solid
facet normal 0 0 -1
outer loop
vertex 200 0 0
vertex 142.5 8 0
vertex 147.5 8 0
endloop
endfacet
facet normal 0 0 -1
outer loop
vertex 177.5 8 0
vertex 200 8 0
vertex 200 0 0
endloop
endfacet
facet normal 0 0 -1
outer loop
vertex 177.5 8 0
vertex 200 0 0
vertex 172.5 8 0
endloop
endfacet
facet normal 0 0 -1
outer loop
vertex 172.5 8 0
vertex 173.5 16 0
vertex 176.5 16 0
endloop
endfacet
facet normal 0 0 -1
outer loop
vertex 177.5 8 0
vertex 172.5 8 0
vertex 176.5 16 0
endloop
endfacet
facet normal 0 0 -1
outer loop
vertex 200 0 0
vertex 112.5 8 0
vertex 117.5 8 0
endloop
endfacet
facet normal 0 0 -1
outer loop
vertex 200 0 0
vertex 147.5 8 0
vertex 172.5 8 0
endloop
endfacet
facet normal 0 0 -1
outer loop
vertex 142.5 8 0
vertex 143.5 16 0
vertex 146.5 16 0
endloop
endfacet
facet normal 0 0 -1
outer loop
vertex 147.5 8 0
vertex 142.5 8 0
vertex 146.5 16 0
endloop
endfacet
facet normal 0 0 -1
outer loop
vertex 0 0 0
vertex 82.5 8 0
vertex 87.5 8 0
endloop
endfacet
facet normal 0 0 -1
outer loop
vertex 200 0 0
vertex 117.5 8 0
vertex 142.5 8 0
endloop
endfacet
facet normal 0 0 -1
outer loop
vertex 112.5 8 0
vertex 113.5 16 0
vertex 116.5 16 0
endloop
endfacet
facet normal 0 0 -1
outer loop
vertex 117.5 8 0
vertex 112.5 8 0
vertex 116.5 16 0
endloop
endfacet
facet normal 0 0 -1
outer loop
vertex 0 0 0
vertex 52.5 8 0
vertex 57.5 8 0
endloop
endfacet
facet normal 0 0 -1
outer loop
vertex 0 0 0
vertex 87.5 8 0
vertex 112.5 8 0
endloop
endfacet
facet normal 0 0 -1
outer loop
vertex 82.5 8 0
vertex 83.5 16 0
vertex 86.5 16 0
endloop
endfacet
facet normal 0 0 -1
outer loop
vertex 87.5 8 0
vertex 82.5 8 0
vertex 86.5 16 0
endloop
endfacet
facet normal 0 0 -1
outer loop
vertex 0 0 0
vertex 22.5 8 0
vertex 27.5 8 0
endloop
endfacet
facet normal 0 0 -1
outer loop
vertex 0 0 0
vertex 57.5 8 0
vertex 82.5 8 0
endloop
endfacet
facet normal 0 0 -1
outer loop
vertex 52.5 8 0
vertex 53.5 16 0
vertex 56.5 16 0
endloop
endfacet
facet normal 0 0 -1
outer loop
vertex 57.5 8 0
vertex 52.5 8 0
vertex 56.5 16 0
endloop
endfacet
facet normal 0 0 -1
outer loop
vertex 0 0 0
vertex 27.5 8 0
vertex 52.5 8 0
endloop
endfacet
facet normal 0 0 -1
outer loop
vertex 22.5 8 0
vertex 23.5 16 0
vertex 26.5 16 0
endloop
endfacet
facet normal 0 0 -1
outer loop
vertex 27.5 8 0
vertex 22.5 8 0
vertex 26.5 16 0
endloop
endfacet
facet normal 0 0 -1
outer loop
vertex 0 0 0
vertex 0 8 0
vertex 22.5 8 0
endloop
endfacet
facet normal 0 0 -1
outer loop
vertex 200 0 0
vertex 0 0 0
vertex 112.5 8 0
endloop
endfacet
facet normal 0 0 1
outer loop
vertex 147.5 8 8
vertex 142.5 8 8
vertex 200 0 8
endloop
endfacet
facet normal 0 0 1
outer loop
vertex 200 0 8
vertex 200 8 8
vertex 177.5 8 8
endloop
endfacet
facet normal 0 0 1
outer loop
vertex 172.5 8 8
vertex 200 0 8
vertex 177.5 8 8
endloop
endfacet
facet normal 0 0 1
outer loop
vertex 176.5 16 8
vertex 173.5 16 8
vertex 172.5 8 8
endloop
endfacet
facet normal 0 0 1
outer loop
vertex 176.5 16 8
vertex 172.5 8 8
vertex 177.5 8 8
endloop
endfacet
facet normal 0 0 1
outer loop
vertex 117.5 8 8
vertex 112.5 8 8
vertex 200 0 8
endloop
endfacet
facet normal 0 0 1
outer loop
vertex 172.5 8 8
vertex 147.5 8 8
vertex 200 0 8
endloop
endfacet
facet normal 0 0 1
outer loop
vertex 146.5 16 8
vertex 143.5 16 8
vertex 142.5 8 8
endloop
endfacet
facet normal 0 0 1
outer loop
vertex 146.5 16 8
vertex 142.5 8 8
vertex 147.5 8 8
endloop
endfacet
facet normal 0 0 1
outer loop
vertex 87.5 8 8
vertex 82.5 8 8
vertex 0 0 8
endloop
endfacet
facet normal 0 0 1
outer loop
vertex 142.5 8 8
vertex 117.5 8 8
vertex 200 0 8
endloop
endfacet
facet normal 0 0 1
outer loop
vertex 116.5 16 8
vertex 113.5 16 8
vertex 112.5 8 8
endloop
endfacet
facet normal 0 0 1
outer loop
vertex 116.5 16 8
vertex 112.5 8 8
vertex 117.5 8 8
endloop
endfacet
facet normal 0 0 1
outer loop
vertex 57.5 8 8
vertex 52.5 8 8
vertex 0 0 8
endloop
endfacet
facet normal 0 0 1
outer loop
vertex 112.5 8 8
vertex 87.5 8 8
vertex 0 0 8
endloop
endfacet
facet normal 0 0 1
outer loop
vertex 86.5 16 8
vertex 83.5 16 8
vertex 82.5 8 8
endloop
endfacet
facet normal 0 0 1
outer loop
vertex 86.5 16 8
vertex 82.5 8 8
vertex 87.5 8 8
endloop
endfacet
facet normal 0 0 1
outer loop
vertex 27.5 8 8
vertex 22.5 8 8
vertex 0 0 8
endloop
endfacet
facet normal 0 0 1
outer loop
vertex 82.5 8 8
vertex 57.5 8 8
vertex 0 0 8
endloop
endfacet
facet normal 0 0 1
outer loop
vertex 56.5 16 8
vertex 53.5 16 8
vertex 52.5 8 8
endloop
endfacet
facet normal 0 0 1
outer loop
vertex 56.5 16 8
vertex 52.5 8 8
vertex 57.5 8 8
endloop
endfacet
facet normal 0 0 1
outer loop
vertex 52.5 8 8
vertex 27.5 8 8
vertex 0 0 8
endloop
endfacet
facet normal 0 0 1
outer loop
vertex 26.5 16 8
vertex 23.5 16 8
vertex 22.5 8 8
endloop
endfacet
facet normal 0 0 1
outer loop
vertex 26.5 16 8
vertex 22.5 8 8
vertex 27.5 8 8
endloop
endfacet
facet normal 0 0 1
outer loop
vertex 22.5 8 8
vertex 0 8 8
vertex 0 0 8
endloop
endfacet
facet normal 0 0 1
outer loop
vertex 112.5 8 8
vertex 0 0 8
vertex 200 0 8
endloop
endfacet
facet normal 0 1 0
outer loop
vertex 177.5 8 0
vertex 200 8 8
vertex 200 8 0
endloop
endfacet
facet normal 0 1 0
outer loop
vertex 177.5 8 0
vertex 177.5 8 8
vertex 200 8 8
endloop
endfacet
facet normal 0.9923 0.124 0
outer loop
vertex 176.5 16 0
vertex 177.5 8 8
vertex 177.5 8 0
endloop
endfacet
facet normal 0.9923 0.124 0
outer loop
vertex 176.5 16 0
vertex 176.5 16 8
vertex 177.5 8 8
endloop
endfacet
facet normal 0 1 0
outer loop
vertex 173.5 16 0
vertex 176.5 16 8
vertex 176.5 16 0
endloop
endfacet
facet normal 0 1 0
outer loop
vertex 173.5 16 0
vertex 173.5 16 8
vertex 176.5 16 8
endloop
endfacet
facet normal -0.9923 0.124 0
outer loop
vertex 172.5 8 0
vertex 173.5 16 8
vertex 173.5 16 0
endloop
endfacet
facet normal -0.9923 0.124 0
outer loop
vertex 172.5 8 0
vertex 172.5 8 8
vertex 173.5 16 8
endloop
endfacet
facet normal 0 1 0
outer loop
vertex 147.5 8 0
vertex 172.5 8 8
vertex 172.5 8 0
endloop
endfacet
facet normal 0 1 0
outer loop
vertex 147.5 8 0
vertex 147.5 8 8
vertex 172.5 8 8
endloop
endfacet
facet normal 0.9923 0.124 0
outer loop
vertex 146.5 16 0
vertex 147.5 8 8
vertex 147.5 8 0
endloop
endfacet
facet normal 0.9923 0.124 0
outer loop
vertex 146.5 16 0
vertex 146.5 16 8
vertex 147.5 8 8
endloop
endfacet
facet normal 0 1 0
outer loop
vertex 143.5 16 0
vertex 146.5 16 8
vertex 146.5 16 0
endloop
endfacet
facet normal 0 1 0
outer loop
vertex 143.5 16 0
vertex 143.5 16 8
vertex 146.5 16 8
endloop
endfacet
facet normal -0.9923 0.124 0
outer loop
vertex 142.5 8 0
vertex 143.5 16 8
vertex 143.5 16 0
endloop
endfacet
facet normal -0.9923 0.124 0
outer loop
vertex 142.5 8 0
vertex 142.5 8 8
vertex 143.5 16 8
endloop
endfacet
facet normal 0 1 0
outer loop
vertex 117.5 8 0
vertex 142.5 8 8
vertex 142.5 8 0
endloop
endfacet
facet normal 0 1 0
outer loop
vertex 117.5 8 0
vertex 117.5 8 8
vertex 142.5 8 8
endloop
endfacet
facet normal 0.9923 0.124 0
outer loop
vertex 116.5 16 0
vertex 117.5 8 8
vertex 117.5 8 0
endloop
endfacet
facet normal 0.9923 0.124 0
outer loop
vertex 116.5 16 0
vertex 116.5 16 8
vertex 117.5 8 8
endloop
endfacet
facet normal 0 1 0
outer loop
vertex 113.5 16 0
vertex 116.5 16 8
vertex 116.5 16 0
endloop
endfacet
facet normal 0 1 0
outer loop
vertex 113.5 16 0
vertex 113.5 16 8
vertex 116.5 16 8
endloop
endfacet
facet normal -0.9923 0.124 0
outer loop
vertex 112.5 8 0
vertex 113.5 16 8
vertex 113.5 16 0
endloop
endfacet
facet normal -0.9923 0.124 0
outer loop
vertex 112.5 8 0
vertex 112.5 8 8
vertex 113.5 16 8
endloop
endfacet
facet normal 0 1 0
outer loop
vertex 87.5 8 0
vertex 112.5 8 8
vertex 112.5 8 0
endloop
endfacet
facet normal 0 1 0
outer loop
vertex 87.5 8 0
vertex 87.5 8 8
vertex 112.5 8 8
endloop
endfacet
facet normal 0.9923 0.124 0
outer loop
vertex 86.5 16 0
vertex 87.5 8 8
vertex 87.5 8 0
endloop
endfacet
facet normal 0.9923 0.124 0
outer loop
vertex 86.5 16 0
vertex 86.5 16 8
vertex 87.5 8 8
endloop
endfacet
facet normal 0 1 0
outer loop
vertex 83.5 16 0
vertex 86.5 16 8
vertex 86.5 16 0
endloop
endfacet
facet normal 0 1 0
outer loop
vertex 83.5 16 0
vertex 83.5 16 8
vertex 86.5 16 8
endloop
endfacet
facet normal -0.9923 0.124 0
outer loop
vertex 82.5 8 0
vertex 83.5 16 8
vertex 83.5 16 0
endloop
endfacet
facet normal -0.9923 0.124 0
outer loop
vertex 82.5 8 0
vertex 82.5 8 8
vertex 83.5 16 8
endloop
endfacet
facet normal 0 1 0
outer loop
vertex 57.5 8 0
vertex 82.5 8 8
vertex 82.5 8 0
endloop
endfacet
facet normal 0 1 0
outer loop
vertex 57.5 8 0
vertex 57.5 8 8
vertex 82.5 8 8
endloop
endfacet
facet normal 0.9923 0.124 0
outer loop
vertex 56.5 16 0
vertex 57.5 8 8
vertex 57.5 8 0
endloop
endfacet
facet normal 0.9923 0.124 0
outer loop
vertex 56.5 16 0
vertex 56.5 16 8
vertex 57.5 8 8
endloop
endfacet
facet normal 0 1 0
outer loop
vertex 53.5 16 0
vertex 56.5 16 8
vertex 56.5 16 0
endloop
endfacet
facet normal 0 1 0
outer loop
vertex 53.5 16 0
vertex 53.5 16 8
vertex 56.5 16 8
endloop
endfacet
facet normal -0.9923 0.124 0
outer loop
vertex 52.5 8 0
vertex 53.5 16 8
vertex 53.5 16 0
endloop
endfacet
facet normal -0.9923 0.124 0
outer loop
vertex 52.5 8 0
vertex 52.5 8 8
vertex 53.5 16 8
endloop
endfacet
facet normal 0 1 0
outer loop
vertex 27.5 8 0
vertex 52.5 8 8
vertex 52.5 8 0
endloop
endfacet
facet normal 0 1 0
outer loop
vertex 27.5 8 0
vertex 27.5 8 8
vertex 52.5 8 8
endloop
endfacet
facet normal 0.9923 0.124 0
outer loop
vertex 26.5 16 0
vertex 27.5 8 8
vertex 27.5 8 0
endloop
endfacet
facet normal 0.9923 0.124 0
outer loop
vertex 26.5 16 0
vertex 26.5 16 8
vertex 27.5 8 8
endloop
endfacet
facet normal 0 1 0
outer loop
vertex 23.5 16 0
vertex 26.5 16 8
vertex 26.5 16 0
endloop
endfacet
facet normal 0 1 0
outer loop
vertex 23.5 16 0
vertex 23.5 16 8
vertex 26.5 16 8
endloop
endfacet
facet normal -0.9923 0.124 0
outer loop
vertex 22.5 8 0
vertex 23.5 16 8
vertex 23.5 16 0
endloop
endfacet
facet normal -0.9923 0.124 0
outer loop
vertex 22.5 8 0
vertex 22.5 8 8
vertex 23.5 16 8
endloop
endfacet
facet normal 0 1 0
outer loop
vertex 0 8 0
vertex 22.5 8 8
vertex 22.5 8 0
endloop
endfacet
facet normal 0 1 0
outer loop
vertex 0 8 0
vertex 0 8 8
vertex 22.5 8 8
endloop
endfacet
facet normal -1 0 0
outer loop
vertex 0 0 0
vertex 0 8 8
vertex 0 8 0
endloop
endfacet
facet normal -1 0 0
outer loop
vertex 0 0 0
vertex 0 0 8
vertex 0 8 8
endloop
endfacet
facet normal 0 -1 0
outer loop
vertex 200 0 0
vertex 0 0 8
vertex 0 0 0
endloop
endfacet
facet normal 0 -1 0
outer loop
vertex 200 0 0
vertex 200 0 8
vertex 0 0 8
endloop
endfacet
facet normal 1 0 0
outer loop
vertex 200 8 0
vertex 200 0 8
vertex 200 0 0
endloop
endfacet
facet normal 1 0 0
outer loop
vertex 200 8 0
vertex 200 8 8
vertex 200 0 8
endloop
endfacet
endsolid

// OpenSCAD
$fn = 32;

// ----------------------------------------------------------------------
// Gear rack: 6 teeth on a 200 mm bar, pitch 30 mm
// ----------------------------------------------------------------------

// --- parameters (mm) ---
profile_height = 8;       // extrusion height
profile_points = 28;      // points of the closed outline

profile = [[0, 0], [200, 0], [200, 8], [177.5, 8], [176.5, 16], [173.5, 16], [172.5, 8], [147.5, 8], [146.5, 16], [143.5, 16], [142.5, 8], [117.5, 8], [116.5, 16], [113.5, 16], [112.5, 8], [87.5, 8], [86.5, 16], [83.5, 16], [82.5, 8], [57.5, 8], [56.5, 16], [53.5, 16], [52.5, 8], [27.5, 8], [26.5, 16], [23.5, 16], [22.5, 8], [0, 8]];  // single closed polygon, 28 points, counter clockwise

// --- the one profile operation ---
linear_extrude(height = profile_height) polygon(points = profile);
